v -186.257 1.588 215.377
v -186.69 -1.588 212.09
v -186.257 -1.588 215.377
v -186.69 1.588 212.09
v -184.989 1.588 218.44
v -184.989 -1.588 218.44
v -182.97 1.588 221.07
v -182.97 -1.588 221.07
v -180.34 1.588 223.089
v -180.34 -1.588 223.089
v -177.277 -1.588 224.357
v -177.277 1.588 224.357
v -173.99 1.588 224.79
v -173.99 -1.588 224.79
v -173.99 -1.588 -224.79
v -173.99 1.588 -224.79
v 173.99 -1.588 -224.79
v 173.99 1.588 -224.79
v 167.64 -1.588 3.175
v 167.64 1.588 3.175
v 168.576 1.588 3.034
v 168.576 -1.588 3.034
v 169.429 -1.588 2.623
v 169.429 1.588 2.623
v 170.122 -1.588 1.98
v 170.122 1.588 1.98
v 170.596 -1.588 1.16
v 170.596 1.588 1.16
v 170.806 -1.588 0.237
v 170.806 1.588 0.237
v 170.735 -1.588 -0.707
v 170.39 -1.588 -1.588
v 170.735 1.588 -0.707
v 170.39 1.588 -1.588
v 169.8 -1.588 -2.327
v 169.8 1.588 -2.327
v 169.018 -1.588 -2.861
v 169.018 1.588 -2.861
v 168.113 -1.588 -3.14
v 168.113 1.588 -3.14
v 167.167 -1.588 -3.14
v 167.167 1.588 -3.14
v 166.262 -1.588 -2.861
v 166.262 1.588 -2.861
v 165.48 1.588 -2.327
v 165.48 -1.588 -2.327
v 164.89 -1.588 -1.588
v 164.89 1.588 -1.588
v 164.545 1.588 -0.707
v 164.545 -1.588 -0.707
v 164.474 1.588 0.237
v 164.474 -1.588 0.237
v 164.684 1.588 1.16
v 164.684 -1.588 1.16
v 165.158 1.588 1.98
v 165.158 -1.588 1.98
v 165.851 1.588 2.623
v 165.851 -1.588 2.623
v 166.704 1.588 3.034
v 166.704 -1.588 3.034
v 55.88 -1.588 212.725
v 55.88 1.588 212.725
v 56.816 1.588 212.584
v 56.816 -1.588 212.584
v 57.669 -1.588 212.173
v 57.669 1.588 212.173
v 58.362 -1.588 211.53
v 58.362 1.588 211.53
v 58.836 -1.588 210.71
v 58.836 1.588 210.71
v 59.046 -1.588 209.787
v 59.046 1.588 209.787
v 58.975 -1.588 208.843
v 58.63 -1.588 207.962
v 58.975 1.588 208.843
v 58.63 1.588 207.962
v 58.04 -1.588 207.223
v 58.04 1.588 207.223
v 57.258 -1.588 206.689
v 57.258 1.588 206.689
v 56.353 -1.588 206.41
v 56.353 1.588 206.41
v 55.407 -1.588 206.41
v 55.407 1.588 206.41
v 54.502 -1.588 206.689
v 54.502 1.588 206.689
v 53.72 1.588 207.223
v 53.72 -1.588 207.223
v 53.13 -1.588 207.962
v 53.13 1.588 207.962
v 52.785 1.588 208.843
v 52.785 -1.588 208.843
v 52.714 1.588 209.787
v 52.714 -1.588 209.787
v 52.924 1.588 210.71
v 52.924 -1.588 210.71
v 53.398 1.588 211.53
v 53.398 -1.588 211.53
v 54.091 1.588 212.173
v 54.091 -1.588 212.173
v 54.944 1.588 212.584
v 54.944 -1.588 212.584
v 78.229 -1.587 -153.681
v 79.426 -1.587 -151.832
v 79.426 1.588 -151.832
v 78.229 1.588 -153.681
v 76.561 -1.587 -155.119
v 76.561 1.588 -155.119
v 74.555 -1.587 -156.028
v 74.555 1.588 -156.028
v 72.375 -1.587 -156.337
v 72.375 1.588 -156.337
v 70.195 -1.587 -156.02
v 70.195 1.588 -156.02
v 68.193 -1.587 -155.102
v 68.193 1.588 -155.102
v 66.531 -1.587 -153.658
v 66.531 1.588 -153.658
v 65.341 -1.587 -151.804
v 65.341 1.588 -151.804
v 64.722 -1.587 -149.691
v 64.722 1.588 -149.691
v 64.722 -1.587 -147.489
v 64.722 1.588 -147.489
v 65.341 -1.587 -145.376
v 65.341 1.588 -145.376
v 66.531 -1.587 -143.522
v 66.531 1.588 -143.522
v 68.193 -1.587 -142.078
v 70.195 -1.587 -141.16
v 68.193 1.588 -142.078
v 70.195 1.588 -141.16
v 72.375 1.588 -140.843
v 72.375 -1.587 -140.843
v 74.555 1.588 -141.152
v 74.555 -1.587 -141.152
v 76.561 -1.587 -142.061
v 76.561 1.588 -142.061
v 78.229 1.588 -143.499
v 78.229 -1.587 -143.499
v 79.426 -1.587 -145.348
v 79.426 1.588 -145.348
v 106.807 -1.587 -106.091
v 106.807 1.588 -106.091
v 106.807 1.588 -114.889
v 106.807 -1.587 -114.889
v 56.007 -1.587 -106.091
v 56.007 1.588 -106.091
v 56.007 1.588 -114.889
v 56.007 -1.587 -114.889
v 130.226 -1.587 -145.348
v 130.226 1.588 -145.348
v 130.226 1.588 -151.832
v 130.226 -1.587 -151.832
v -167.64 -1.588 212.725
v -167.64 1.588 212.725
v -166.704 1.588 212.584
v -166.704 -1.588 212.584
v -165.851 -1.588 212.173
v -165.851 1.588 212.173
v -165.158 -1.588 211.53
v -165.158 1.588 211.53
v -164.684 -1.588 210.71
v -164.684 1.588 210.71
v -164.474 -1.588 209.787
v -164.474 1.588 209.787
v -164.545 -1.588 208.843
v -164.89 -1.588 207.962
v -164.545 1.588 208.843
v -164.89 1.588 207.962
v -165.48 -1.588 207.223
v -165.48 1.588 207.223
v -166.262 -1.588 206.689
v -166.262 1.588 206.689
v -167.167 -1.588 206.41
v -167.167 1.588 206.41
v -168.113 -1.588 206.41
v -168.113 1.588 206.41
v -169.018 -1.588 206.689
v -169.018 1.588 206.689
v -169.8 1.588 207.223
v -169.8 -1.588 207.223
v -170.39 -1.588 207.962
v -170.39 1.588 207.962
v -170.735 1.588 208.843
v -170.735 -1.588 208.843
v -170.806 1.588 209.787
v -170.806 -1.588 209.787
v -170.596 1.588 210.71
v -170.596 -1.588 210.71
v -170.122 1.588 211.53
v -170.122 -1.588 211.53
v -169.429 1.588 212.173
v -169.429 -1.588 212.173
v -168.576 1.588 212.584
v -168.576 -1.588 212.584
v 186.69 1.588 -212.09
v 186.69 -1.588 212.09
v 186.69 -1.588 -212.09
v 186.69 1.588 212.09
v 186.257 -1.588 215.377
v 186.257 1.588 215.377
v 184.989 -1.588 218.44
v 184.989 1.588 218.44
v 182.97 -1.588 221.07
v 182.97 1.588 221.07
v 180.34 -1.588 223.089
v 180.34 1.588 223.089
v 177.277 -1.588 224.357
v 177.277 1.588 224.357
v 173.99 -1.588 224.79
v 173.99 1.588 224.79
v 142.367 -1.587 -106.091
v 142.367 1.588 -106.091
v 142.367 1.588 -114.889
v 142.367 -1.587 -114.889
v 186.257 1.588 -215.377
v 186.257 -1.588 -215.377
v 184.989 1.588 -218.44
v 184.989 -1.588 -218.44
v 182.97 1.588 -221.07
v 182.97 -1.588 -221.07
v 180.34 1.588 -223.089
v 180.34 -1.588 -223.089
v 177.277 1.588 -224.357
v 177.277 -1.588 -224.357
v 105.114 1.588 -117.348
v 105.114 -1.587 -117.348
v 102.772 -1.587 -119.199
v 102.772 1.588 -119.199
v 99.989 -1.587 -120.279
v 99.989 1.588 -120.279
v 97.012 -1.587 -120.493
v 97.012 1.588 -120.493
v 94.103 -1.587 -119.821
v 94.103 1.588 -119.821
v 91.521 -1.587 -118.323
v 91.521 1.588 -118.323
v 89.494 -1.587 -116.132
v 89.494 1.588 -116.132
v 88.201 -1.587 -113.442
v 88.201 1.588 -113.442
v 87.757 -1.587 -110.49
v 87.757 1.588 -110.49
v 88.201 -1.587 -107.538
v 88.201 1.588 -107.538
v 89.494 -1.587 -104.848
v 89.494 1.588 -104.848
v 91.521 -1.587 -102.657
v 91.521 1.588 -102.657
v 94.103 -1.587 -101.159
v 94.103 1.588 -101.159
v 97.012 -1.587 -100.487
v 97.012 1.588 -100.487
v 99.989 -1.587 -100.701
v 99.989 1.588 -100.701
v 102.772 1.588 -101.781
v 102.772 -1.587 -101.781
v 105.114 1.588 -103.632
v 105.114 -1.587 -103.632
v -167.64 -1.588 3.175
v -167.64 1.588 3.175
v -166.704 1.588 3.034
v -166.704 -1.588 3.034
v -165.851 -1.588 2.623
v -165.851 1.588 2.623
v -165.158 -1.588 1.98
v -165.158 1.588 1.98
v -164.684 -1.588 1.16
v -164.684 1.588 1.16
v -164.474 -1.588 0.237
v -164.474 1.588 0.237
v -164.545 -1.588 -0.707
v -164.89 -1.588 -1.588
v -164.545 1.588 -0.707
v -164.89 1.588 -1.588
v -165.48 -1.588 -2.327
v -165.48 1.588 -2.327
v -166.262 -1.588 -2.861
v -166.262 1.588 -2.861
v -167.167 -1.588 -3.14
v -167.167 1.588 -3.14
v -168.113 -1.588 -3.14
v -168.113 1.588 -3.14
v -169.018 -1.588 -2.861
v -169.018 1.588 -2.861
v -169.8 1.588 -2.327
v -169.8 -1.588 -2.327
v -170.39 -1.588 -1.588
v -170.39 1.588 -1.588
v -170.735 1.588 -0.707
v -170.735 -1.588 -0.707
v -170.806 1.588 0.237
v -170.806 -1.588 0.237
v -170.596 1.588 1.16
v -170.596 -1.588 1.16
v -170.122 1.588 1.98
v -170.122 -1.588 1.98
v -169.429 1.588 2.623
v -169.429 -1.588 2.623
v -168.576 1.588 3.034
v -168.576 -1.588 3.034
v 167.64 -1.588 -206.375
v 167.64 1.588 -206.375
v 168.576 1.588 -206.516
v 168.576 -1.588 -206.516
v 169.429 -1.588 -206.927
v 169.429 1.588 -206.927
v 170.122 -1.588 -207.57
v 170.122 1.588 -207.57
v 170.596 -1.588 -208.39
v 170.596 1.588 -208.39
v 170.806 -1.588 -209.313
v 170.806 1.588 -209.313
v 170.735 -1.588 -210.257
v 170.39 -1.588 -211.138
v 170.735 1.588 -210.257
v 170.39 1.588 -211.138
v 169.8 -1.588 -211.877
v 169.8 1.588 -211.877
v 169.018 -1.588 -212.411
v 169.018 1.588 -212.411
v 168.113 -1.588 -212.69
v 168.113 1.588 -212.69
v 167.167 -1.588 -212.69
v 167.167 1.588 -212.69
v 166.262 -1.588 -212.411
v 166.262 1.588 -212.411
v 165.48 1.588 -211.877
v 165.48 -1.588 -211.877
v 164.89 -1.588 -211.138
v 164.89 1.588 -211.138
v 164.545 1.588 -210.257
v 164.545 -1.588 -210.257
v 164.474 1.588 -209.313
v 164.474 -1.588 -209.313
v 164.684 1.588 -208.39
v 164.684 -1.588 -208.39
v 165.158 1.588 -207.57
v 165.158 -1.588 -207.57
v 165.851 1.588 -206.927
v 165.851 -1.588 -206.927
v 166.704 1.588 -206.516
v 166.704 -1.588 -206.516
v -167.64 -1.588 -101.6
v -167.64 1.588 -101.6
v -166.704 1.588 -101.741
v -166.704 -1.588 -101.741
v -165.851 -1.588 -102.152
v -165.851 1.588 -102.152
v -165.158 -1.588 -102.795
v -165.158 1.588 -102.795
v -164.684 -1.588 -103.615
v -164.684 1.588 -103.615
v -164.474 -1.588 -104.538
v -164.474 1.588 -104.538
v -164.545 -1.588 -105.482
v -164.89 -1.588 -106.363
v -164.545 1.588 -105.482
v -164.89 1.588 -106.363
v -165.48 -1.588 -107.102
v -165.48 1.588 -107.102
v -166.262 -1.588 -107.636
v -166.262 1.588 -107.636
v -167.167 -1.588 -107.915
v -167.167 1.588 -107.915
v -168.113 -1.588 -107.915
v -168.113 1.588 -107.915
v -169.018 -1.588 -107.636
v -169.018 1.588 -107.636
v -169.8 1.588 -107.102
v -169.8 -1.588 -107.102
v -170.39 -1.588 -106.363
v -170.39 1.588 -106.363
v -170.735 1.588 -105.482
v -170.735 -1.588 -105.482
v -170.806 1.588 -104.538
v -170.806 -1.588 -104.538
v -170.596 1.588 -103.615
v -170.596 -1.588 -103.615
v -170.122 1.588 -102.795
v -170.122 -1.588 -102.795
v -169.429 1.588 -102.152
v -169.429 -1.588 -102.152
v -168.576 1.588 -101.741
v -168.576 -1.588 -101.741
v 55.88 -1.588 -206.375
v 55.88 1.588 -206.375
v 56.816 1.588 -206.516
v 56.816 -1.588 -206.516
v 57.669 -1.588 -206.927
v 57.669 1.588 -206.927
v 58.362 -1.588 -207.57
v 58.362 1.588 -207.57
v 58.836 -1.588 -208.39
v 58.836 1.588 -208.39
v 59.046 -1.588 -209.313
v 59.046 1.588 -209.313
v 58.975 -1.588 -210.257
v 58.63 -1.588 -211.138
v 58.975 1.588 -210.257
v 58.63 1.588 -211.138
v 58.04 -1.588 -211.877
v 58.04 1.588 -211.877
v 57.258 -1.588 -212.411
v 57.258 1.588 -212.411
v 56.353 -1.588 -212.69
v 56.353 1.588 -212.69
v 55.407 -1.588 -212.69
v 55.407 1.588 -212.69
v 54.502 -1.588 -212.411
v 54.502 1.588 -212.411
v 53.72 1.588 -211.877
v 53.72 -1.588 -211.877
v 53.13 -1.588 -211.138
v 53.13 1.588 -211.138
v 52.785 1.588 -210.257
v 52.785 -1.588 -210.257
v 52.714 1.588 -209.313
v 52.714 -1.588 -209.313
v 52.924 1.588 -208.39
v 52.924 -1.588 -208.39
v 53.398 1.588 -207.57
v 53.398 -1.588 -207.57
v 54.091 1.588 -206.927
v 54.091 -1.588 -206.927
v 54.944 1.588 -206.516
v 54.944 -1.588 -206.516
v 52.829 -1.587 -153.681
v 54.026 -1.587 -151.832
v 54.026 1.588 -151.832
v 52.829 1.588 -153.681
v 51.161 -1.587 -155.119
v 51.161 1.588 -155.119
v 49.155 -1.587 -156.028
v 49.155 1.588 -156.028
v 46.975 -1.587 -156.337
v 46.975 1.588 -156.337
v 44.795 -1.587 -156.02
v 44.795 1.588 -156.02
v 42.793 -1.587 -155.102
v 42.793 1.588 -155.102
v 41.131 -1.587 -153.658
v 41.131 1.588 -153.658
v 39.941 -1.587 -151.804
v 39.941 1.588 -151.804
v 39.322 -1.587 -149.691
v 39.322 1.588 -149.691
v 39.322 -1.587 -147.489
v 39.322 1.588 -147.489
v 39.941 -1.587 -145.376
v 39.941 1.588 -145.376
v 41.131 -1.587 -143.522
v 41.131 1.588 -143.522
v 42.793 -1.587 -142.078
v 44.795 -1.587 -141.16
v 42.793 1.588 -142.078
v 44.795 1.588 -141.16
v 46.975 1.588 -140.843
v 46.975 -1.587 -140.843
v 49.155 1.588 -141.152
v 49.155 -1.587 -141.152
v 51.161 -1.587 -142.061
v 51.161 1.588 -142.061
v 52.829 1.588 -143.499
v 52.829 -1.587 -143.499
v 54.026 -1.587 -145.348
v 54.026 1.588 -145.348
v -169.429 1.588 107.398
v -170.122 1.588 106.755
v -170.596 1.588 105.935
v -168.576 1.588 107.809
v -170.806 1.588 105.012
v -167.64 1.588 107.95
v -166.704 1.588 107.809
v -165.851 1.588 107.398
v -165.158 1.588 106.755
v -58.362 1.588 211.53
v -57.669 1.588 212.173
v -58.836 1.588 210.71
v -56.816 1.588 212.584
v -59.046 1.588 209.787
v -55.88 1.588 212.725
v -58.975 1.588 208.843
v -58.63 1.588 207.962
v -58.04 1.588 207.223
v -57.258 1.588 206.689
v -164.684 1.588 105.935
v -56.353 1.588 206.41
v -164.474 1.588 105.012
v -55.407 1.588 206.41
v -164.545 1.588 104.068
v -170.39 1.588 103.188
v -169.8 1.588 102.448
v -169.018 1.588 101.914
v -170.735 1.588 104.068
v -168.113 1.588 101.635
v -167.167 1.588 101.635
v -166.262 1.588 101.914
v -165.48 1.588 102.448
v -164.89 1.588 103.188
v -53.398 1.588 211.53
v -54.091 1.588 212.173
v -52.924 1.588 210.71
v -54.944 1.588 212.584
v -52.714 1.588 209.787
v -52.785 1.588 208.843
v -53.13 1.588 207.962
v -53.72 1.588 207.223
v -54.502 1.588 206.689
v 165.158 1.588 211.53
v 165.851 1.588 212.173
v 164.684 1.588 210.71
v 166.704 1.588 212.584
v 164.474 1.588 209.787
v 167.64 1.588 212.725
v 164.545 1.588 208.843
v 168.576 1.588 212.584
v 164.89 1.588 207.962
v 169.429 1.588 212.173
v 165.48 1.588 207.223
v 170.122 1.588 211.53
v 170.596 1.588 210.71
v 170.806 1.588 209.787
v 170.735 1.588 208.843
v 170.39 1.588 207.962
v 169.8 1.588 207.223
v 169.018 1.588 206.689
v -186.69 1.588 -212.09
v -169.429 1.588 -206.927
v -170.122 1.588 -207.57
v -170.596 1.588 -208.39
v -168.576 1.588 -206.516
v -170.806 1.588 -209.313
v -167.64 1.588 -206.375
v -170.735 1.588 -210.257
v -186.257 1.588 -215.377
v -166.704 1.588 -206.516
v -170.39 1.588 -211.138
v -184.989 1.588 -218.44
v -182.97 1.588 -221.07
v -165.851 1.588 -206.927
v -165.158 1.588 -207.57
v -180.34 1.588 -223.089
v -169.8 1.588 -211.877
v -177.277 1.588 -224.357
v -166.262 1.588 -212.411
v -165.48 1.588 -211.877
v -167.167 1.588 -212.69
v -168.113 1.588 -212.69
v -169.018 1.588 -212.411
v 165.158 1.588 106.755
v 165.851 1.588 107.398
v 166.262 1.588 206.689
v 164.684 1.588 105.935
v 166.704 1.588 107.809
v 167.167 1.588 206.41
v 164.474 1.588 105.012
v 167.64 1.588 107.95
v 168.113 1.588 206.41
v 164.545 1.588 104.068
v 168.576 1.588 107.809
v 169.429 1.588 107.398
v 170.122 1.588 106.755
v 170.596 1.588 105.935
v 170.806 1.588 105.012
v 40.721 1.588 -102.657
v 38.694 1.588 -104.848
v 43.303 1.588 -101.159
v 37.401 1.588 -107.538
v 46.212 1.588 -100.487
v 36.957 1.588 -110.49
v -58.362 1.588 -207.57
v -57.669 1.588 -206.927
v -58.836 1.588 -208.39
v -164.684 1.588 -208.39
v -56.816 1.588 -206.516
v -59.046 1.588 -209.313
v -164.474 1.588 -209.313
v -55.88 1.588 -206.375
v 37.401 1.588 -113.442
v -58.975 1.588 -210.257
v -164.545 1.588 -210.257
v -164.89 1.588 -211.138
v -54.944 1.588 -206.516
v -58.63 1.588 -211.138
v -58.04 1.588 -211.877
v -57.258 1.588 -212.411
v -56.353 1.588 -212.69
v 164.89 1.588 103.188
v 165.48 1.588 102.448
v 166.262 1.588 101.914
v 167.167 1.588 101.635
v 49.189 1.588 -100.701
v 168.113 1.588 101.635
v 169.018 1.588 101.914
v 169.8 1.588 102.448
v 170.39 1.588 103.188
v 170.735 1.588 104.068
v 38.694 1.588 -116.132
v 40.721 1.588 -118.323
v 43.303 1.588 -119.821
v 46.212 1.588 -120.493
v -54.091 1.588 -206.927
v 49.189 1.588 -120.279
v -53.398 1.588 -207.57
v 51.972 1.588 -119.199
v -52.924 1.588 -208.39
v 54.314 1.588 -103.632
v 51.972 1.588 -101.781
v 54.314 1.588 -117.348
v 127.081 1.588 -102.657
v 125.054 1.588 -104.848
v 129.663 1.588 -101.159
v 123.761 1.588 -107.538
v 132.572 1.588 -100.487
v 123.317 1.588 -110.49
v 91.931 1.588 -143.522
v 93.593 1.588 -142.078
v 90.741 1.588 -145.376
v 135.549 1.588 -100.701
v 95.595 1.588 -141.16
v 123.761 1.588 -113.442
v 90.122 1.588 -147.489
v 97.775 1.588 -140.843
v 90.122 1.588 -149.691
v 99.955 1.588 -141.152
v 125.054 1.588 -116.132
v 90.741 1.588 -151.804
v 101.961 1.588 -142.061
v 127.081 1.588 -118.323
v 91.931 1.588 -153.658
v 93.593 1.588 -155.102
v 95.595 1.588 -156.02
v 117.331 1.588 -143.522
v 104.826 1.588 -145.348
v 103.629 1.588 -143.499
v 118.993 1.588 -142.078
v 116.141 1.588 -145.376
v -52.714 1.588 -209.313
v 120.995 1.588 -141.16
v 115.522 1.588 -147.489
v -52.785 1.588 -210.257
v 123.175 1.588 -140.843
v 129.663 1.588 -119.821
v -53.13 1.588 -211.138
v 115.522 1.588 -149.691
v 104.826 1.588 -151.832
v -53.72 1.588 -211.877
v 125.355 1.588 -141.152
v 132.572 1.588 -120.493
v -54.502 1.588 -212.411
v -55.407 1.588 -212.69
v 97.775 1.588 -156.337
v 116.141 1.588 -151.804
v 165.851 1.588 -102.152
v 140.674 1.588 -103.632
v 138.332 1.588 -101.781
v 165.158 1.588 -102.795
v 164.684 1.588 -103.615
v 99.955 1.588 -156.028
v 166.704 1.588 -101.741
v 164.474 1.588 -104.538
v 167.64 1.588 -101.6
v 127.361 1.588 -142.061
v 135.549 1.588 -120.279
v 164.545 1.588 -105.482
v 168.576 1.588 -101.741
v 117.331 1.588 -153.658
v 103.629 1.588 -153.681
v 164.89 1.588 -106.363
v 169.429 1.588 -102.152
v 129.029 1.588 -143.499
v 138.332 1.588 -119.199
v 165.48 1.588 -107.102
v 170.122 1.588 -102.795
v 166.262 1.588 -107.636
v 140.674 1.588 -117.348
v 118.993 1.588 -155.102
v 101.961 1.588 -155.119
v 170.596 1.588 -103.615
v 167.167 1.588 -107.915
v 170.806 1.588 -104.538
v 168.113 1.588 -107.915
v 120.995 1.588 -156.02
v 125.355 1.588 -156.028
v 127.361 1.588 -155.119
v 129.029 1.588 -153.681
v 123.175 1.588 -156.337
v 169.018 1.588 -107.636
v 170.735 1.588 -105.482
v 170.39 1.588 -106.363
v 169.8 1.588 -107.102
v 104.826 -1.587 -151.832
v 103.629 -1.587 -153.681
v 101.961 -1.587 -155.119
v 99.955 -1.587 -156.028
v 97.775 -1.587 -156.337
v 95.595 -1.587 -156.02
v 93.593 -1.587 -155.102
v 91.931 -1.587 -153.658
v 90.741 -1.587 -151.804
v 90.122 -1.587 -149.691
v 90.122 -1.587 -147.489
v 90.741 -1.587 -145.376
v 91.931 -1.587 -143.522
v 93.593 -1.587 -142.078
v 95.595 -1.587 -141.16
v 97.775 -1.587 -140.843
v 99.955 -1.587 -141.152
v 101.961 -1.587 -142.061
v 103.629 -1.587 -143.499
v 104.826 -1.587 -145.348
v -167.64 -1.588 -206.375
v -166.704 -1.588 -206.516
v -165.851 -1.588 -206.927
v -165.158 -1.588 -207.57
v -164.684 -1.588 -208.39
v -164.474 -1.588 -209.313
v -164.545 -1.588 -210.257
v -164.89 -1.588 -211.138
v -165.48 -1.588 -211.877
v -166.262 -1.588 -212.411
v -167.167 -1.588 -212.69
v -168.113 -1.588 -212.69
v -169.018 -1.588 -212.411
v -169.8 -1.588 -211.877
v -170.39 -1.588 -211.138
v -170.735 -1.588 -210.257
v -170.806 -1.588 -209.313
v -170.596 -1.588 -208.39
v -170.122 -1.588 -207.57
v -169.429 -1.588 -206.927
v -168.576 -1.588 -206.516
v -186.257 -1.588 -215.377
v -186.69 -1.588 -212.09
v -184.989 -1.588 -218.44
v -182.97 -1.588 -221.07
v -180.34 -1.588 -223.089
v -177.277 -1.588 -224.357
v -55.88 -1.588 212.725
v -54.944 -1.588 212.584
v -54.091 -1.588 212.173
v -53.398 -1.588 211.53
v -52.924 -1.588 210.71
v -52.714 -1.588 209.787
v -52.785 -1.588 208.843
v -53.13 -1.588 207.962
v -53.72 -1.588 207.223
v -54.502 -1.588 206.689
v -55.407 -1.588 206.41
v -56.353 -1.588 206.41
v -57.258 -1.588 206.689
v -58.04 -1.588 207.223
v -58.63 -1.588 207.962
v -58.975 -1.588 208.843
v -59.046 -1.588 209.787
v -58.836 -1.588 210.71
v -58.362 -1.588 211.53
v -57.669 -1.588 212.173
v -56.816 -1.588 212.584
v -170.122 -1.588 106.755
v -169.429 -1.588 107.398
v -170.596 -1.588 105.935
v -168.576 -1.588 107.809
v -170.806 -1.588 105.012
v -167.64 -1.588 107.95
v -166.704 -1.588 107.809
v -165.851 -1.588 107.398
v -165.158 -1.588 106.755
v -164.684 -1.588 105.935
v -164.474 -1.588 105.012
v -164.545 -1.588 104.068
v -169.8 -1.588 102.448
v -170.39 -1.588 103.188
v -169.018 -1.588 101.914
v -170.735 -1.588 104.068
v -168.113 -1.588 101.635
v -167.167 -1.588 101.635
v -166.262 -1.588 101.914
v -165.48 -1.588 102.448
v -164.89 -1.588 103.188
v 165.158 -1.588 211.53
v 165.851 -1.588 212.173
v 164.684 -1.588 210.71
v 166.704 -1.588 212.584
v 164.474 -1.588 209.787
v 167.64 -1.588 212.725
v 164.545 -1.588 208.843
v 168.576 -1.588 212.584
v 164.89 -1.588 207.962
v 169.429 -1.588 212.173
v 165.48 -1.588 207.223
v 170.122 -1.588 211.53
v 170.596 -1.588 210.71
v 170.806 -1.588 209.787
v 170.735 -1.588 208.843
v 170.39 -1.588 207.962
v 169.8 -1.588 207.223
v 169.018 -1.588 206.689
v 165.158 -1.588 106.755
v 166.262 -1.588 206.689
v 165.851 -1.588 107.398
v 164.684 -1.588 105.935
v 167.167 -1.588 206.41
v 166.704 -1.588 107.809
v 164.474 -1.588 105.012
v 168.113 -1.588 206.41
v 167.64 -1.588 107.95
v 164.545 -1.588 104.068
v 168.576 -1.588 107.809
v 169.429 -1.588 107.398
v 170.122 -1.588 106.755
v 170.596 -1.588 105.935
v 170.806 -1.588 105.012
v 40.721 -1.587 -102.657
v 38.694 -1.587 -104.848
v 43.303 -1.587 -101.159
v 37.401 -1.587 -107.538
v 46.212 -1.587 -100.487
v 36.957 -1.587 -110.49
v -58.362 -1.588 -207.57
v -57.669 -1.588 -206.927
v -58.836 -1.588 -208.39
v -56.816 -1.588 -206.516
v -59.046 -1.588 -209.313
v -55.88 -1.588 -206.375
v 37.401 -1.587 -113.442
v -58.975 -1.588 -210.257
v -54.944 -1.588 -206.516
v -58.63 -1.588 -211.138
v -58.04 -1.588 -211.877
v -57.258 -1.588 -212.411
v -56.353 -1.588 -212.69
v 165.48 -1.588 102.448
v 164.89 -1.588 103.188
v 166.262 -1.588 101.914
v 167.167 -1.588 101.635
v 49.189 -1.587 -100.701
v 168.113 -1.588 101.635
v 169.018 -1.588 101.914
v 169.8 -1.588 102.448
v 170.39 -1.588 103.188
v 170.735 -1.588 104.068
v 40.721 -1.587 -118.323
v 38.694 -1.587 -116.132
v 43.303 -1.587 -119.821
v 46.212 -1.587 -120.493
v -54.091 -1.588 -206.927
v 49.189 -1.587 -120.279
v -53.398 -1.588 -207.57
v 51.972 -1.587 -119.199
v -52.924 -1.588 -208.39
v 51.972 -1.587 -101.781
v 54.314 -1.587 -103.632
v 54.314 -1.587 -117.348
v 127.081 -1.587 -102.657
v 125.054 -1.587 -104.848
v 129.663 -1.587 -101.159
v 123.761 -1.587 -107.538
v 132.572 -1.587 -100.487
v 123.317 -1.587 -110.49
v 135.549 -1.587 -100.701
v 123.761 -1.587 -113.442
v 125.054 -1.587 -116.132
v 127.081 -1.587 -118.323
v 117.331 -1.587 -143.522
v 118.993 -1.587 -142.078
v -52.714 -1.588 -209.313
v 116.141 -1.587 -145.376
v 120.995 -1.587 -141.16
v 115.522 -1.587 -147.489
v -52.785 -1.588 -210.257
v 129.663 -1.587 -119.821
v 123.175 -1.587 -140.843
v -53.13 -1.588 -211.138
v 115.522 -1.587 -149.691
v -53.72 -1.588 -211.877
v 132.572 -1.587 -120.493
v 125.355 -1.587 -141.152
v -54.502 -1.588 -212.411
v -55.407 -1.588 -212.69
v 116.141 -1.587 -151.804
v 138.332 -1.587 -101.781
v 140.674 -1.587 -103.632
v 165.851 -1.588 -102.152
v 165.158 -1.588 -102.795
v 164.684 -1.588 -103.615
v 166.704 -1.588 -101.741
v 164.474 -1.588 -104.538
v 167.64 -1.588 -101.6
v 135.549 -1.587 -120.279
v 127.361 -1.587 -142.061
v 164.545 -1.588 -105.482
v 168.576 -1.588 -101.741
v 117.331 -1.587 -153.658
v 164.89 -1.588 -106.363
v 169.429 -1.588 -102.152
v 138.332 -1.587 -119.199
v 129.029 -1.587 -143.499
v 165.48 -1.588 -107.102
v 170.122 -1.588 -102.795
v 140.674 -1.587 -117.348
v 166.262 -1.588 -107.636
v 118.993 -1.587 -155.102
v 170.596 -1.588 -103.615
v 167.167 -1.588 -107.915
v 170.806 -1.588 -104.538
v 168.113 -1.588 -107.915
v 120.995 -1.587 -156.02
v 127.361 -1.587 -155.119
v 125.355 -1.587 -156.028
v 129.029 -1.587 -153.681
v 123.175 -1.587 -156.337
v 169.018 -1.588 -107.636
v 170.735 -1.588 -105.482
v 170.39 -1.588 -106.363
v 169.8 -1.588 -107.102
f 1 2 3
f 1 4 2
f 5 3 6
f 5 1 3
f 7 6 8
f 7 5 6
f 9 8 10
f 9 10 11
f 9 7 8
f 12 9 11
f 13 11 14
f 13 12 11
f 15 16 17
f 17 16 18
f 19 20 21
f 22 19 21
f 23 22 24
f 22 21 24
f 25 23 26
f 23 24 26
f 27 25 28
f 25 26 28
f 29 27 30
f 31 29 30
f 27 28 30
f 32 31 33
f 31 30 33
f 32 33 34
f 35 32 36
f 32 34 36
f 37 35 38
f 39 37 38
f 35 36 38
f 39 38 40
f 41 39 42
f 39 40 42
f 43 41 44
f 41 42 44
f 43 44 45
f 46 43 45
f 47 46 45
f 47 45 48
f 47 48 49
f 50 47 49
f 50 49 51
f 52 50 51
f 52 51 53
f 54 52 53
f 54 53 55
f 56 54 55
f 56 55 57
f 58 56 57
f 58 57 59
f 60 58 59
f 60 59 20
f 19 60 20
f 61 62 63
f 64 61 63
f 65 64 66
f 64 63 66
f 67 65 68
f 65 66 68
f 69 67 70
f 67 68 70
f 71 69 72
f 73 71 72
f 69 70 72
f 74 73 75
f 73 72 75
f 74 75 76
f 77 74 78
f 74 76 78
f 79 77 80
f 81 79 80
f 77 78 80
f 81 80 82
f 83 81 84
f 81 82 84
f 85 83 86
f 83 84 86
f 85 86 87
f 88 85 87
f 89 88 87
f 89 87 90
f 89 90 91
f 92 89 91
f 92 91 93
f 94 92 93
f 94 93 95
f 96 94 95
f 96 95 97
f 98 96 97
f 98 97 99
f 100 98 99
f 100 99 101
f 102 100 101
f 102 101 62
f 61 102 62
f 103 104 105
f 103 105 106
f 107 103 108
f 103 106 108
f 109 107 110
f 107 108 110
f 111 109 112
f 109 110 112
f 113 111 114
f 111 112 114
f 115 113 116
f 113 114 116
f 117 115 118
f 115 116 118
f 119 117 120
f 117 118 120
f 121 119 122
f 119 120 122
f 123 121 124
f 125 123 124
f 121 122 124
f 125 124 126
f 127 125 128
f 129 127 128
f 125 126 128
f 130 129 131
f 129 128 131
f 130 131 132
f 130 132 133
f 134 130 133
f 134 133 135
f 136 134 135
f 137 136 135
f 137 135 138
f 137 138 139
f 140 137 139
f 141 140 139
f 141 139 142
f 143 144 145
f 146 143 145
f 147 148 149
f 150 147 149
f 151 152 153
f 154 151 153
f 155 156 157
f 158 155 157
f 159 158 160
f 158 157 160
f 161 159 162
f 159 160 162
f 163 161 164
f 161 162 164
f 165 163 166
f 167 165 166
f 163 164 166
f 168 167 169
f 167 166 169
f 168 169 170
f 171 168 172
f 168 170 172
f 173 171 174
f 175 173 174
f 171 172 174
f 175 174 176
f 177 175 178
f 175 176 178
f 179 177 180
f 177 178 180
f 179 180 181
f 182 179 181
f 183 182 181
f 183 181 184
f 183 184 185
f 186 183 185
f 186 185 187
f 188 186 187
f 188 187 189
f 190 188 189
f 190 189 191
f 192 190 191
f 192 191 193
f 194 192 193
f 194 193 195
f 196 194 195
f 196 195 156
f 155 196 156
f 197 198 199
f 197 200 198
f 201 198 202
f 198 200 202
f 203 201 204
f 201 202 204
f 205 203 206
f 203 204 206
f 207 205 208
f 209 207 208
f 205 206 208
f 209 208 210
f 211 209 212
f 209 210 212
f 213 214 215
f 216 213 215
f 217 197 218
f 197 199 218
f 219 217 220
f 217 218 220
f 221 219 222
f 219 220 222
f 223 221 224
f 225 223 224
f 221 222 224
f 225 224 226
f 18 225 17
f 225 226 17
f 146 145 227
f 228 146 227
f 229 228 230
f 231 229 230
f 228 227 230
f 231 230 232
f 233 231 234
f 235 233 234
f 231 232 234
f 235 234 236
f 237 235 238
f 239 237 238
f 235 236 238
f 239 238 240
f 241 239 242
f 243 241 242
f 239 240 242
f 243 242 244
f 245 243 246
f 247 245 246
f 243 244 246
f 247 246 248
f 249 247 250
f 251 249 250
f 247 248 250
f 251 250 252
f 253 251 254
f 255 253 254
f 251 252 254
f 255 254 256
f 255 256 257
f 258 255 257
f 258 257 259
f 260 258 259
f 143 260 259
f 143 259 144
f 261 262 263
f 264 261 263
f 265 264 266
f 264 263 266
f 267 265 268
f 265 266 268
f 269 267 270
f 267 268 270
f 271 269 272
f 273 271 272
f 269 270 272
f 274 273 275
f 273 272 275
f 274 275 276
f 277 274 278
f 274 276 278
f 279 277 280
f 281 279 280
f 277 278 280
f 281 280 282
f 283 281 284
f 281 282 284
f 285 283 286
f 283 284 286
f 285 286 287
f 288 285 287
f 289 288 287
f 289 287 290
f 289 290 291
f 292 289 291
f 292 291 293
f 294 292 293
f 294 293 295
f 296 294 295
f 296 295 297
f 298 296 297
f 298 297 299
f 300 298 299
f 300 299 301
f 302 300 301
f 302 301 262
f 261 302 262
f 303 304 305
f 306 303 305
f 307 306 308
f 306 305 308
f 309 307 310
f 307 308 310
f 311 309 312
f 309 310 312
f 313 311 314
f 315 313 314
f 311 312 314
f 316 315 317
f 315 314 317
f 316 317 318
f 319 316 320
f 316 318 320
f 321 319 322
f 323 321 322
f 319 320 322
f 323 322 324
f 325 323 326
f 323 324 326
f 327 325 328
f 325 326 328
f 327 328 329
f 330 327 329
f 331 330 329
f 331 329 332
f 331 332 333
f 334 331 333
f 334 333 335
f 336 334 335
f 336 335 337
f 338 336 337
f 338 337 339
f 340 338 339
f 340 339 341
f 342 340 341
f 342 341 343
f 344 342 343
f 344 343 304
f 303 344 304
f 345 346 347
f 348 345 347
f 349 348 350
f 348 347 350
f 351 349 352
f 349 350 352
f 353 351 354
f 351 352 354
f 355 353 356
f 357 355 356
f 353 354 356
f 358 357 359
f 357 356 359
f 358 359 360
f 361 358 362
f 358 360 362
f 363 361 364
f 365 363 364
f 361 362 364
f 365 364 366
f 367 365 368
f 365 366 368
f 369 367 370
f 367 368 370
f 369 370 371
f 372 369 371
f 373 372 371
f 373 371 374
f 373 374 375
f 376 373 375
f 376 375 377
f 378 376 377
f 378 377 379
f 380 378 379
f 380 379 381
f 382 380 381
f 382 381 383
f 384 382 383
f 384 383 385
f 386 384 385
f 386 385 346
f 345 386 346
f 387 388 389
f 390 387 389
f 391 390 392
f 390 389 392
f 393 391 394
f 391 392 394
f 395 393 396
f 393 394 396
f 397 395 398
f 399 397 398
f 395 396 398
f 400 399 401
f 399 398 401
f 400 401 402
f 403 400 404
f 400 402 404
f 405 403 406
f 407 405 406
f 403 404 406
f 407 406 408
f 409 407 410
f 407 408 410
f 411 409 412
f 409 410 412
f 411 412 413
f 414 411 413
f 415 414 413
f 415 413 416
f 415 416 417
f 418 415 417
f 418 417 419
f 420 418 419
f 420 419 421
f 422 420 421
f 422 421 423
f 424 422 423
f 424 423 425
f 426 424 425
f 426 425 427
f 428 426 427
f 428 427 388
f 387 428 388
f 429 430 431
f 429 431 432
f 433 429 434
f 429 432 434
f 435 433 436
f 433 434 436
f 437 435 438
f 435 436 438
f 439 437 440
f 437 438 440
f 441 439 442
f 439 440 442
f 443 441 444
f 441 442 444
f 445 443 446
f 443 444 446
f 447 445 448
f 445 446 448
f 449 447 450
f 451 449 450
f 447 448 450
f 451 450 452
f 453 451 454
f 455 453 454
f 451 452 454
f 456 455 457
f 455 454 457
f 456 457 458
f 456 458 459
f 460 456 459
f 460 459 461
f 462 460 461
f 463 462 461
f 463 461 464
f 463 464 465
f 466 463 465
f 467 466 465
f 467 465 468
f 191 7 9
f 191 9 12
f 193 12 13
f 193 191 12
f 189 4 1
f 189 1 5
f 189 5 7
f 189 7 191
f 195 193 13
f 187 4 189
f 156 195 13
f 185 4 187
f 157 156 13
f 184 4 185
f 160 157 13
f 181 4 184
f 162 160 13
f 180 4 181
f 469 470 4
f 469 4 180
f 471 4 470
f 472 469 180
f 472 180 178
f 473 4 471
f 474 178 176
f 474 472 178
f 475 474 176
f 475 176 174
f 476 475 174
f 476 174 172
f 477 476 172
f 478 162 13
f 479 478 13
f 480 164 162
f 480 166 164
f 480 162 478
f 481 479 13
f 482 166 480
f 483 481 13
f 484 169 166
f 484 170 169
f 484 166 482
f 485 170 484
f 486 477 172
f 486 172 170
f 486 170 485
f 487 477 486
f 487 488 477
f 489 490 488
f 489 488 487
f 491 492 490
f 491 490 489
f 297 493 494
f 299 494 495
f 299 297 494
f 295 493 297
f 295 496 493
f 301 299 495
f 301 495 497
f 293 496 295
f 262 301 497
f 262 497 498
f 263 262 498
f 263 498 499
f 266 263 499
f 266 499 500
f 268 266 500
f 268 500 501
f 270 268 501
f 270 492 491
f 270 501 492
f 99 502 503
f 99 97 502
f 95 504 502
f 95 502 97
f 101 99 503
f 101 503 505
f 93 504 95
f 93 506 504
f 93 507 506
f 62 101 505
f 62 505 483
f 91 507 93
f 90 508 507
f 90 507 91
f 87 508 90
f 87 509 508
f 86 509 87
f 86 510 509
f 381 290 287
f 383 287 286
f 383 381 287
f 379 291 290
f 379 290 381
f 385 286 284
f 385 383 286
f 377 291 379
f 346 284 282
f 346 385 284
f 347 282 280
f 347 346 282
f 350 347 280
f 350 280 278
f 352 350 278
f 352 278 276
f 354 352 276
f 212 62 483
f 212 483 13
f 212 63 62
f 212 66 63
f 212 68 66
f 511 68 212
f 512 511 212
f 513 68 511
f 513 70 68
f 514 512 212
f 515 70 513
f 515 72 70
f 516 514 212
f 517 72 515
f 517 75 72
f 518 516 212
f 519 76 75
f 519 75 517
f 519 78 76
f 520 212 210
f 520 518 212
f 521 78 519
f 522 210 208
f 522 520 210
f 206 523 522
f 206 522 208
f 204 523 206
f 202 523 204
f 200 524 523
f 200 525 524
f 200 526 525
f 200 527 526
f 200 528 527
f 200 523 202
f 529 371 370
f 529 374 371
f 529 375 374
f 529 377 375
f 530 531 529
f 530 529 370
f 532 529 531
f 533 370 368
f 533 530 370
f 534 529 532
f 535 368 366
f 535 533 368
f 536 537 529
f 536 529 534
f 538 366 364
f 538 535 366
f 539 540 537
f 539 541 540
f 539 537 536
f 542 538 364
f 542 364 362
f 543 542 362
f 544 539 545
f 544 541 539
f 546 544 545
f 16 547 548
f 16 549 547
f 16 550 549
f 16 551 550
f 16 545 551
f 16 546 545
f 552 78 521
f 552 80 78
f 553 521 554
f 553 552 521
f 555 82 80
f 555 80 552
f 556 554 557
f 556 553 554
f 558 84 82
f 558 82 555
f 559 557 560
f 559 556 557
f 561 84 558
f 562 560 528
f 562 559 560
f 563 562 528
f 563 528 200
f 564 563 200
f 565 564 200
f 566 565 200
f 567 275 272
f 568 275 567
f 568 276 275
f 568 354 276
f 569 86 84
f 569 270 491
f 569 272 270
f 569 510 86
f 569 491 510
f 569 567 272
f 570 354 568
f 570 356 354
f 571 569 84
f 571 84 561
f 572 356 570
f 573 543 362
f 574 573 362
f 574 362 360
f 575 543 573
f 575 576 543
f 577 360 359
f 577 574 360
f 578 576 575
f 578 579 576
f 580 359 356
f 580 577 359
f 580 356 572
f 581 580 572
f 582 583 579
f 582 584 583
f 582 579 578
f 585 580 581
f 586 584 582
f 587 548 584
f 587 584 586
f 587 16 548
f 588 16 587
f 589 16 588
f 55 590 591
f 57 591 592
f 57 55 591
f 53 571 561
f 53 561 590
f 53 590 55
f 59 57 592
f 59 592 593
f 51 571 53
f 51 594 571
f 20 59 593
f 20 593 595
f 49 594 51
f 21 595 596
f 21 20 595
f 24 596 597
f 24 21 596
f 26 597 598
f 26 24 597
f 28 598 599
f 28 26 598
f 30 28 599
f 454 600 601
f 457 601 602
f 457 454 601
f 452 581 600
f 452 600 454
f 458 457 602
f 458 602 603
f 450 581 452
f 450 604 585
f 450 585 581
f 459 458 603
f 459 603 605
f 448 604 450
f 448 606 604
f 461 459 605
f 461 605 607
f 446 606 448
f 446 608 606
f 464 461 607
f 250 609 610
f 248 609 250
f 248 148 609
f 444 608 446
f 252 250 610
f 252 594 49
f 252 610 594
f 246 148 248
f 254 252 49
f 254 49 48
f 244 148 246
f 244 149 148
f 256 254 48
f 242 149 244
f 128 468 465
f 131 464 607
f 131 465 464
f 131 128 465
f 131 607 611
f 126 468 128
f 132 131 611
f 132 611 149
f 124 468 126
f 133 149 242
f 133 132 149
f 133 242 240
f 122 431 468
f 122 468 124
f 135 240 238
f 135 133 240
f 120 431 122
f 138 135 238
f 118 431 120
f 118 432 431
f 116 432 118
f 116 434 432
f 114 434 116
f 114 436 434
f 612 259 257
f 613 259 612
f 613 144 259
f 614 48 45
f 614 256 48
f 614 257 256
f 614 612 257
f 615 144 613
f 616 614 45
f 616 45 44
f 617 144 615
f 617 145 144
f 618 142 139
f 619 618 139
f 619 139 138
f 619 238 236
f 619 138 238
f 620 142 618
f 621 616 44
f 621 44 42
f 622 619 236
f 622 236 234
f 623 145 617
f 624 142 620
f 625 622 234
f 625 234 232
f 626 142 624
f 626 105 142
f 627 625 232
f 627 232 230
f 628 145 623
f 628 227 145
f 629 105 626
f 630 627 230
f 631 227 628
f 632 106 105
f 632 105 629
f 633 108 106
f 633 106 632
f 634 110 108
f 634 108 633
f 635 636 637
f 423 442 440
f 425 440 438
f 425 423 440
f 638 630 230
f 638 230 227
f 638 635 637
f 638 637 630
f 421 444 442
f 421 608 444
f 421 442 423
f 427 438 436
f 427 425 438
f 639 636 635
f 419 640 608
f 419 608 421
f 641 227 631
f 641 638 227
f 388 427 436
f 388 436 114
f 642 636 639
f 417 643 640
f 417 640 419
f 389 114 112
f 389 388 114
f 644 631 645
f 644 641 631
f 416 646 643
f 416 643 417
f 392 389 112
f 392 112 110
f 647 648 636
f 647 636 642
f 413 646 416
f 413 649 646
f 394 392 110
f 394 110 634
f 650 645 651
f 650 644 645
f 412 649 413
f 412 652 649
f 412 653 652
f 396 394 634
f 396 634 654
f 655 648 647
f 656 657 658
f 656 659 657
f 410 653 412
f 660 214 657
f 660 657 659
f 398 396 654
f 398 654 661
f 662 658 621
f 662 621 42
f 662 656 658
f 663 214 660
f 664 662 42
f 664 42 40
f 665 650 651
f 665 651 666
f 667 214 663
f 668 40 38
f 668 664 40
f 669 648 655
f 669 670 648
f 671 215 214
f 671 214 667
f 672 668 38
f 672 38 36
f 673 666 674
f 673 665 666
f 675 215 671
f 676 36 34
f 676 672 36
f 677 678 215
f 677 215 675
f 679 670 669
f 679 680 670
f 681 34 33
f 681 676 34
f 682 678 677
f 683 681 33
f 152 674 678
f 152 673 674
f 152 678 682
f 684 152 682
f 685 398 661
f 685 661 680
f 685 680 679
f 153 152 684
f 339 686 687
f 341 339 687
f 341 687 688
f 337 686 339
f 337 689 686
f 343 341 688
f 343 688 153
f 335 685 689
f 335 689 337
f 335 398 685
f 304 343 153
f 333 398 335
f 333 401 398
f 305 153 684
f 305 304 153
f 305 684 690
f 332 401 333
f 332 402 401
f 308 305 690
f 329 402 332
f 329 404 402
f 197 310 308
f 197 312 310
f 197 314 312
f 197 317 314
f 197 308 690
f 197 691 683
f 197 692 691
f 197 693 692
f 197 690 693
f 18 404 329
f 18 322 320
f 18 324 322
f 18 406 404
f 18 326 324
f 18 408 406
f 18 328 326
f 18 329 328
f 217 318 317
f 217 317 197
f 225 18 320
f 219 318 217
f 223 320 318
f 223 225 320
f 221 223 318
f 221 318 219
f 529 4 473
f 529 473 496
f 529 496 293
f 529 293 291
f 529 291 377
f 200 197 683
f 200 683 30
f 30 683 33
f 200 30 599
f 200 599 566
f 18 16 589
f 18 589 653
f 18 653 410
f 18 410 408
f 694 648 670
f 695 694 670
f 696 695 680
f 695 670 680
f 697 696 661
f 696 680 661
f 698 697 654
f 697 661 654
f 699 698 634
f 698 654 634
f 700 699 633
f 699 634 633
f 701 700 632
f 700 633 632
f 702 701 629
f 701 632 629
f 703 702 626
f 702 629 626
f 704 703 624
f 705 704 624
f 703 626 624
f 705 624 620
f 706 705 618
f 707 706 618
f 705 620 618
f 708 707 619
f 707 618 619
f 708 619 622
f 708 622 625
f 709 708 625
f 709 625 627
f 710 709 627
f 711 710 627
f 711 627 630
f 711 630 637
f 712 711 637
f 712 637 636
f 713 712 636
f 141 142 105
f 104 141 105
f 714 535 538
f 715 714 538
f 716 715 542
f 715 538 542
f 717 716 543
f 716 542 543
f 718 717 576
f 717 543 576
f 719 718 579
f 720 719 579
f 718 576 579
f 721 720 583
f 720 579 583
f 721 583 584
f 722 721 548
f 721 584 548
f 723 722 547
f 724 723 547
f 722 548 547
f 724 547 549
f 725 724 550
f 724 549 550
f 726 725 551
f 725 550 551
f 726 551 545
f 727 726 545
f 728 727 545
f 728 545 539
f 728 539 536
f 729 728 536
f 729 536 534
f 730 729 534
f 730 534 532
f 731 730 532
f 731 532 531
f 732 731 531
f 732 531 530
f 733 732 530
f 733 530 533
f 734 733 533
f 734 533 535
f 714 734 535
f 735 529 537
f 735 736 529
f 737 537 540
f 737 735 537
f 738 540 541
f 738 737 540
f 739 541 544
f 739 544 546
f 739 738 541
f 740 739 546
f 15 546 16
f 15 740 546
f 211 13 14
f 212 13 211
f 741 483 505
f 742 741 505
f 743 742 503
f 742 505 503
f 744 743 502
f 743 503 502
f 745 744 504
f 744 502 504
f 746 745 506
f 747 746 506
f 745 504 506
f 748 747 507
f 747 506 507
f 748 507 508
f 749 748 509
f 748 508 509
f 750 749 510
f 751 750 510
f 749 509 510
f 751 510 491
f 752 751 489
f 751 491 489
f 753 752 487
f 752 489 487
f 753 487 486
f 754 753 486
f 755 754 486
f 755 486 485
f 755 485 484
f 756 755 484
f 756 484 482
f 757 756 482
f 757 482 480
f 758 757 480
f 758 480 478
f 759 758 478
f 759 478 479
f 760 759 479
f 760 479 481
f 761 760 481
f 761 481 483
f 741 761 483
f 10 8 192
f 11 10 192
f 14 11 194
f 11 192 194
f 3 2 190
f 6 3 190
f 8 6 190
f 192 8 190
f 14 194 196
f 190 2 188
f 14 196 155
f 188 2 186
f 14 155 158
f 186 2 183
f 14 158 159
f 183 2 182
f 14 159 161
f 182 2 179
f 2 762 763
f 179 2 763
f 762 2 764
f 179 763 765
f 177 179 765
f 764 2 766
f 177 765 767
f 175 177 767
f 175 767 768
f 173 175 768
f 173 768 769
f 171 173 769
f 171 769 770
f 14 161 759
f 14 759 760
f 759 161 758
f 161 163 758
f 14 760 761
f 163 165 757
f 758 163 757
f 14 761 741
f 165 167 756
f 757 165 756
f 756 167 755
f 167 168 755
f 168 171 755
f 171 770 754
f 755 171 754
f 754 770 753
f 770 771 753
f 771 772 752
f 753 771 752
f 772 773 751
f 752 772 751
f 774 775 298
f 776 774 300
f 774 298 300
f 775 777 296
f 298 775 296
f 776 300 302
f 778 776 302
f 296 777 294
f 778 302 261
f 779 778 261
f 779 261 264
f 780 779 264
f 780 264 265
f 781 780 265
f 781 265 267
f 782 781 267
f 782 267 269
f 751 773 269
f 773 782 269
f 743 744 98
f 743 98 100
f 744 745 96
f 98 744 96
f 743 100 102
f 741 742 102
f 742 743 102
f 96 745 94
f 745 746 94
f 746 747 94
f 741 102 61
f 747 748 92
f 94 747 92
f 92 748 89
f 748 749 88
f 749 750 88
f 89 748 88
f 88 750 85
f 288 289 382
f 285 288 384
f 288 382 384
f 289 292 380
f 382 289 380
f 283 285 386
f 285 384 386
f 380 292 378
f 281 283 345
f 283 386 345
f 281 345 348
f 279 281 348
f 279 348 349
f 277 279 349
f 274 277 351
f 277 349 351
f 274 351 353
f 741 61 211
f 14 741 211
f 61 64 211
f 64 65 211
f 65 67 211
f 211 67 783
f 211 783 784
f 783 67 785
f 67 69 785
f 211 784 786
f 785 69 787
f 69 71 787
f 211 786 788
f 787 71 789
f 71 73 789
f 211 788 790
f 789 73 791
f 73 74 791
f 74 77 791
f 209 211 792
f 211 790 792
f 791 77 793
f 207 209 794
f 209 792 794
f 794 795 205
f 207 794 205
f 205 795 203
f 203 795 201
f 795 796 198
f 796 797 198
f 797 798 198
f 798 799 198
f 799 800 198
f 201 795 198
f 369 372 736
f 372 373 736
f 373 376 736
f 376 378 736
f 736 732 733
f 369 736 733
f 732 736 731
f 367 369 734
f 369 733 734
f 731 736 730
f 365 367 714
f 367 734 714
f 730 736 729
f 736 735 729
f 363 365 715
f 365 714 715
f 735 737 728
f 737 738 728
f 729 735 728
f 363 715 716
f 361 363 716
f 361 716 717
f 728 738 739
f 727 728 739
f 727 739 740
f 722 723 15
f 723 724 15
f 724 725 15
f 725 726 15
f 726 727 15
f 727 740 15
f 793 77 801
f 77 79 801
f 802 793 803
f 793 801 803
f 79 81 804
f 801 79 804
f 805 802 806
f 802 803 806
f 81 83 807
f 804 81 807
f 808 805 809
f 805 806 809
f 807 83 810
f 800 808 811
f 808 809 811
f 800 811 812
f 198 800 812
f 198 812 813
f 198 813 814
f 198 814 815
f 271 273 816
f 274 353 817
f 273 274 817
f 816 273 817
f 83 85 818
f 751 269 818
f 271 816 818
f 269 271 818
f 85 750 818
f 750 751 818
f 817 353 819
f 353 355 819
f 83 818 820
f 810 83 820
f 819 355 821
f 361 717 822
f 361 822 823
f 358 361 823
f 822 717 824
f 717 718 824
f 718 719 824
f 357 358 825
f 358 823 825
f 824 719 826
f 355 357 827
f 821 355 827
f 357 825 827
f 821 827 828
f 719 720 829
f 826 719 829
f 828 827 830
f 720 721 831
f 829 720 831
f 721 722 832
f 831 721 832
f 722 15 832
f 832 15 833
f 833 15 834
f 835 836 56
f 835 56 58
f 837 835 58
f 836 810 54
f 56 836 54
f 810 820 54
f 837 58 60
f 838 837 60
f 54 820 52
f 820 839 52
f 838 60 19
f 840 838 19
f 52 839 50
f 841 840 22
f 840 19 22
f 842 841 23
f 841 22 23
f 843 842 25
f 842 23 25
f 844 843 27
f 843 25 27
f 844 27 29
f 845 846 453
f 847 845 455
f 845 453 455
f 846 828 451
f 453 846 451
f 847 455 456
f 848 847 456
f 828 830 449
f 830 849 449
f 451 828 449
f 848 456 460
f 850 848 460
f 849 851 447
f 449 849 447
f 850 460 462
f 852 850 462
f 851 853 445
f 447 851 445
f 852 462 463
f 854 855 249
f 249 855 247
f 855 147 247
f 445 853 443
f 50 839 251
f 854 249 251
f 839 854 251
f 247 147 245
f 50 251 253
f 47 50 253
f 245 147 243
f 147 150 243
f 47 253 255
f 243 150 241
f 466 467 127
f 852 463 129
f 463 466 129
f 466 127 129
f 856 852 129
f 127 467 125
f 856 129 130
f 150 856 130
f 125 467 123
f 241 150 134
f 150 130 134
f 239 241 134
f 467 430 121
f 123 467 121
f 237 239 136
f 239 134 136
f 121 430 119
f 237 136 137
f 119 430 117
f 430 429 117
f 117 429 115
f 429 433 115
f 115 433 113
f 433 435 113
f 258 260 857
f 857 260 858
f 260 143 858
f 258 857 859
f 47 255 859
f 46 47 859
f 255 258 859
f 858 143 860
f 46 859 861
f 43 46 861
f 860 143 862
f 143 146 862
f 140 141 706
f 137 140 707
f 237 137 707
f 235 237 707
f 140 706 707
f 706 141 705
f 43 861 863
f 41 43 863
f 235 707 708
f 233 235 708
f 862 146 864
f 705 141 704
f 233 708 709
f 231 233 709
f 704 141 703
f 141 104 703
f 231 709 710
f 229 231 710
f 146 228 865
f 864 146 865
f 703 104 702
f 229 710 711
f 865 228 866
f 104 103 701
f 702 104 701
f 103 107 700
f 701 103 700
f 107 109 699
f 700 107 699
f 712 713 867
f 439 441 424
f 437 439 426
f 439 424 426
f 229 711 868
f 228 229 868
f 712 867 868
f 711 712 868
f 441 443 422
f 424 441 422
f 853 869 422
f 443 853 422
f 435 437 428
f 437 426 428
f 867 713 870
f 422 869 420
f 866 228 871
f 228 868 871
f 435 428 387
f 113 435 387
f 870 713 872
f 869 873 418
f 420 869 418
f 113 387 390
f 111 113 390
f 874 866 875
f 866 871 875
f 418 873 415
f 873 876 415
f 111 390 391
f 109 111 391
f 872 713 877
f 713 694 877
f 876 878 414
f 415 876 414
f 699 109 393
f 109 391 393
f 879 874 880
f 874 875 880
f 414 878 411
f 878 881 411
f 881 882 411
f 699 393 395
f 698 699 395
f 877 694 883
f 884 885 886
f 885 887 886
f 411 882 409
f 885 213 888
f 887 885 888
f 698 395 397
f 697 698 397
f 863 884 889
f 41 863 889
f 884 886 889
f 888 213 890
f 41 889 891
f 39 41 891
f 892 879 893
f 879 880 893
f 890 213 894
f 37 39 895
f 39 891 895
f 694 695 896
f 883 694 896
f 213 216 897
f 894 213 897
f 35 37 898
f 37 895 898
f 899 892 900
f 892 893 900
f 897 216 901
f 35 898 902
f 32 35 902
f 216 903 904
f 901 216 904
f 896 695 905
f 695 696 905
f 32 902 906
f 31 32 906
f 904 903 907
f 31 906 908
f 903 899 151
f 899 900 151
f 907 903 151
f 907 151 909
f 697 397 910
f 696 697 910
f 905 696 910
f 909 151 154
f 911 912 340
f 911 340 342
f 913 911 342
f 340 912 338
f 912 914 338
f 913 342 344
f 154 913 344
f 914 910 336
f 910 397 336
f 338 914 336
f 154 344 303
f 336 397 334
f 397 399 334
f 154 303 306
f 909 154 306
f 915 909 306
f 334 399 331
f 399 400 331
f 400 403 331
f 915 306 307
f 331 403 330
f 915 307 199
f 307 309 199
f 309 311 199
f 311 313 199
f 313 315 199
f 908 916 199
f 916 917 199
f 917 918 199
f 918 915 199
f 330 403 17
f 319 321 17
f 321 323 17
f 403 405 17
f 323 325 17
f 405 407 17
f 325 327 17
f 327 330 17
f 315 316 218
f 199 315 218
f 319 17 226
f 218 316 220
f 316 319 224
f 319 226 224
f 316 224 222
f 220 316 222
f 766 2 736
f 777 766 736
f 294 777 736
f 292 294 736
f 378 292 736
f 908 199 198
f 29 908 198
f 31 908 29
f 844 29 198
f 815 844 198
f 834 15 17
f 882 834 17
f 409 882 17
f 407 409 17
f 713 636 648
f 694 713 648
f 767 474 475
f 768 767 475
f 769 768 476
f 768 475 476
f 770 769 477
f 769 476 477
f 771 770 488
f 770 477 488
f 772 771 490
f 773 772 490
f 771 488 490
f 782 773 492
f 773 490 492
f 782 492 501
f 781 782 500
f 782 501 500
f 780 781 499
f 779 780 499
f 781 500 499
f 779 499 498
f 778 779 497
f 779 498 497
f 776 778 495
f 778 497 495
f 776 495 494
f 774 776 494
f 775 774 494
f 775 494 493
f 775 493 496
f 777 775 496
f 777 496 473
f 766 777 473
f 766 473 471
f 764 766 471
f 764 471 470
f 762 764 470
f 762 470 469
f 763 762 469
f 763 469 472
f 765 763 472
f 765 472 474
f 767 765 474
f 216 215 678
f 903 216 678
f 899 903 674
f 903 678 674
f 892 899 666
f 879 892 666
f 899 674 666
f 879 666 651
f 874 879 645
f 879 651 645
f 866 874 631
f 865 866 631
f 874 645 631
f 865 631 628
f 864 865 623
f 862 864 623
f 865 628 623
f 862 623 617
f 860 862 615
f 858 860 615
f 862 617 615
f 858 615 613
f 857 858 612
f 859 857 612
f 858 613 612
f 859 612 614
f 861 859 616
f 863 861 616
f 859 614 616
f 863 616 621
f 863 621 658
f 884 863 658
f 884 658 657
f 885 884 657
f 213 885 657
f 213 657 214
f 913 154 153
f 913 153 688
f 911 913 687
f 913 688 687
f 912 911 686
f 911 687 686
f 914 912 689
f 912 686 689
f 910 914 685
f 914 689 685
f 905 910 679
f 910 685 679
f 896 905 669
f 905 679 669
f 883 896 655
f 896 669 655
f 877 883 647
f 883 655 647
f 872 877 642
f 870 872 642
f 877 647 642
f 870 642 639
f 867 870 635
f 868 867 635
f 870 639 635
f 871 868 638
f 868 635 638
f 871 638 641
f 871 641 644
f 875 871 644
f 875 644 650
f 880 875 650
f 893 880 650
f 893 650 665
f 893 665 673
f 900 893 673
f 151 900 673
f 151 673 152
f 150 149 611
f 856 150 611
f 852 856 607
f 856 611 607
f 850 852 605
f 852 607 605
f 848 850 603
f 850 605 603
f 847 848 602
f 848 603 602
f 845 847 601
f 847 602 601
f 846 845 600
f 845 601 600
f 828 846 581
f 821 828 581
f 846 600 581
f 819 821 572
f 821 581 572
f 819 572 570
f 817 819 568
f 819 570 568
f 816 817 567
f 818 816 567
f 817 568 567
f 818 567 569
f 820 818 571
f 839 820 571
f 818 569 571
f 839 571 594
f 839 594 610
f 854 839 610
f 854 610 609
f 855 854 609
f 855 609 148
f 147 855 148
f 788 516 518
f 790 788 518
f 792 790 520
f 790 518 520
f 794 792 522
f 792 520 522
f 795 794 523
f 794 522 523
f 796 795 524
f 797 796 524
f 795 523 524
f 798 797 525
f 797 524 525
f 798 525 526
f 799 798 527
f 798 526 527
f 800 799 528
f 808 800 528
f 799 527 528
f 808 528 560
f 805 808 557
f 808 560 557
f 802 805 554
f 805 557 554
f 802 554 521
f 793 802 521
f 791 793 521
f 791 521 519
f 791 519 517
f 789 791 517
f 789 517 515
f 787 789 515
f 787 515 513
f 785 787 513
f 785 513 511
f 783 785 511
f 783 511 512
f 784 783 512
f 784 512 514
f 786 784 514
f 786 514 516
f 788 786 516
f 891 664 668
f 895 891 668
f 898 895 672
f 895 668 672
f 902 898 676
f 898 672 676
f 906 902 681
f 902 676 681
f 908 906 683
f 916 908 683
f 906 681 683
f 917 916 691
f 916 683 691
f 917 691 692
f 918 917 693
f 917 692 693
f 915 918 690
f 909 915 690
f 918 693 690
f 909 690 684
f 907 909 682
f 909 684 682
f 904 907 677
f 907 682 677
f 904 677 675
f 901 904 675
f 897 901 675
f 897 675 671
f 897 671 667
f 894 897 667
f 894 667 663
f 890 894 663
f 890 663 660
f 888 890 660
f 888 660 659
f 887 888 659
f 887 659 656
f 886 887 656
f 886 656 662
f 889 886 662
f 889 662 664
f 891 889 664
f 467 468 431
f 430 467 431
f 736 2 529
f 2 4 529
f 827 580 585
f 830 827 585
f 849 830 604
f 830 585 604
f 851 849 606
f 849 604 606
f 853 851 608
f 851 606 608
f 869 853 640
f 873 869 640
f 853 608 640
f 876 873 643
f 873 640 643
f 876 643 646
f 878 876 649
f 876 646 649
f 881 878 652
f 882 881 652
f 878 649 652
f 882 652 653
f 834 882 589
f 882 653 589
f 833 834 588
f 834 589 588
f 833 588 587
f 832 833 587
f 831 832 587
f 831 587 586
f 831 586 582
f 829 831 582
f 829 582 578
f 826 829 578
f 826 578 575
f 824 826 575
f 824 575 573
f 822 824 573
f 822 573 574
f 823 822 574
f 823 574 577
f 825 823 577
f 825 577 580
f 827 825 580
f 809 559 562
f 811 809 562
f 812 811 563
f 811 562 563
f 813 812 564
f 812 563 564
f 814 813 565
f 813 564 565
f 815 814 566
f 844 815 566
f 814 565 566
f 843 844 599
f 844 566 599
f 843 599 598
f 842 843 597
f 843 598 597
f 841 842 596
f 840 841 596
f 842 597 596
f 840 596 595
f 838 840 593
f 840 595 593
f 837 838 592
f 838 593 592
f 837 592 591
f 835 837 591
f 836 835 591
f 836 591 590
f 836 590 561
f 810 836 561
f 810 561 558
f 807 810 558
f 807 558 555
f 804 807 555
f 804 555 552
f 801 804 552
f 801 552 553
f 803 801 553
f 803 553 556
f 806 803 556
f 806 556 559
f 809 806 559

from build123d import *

# Parameters (mm, degrees)
SKETCH1_W            = 373.38
SKETCH1_H            = 449.58
BOSS_EXTRUDE1_DEPTH  = 1.5875
FILLET1_R            = 12.7
SKETCH2_R            = 3.175
CUT_EXTRUDE1_DEPTH   = 293.222142941
LPATTERN1_COUNT      = 4
LPATTERN1_PITCH      = 111.76
LPATTERN1_COUNT_DIR2 = 5
LPATTERN1_PITCH_DIR2 = 104.775
CUT_EXTRUDE2_DEPTH   = 303.544238838


with BuildPart() as part:
    # Sketch1 → Boss-Extrude1 (new, symmetric)
    with BuildSketch(Plane(origin=(0, 0, 0), x_dir=(1, 0, 0), z_dir=(0, 1, 0))):
        Rectangle(SKETCH1_W, SKETCH1_H)
    extrude(amount=BOSS_EXTRUDE1_DEPTH, both=True)

    # Fillet1
    fillet1_edges = [part.edges().sort_by_distance(p)[0] for p in [
        (186.69, 0, 224.79),
        (-186.69, 0, 224.79),
        (-186.69, 0, -224.79),
        (186.69, 0, -224.79),
    ]]
    fillet(fillet1_edges, radius=FILLET1_R)

    # Sketch2 → Cut-Extrude1 (cut, through all)
    with BuildSketch(Plane(origin=(0, 1.5875, 0), x_dir=(1, 0, 0), z_dir=(0, 1, 0))):
        with Locations(Location((-167.64, 209.55, 0), (0, 0, 270))):
            Circle(SKETCH2_R)
    cut_extrude1 = extrude(amount=-CUT_EXTRUDE1_DEPTH, mode=Mode.SUBTRACT)

    # LPattern1: Cut-Extrude1 4 × 5, 6 skipped
    with Locations(*[(i * LPATTERN1_PITCH, 0, j * LPATTERN1_PITCH_DIR2) for i in range(LPATTERN1_COUNT) for j in range(LPATTERN1_COUNT_DIR2) if (i, j) not in ((0, 0), (1, 1), (1, 2), (1, 3), (2, 1), (2, 2), (2, 3))]):
        add(cut_extrude1, mode=Mode.SUBTRACT)

    # Sketch3 → Cut-Extrude2 (cut, through all)
    with BuildSketch(Plane(origin=(13.560082756, 17.4625, -1.196765785), x_dir=(1, 0, 0), z_dir=(0, 1, 0))):
        with BuildLine():
            ThreePointArc((128.806917244, 113.692643266), (109.756917244, 109.293234215), (128.806917244, 104.893825163))
            Line((128.806917244, 104.893825163), (128.806917244, 113.692643266))
        make_face()
        with BuildLine():
            ThreePointArc((116.665717244, 150.635691209), (101.882917244, 147.393234215), (116.665717244, 144.15077722))
            Line((116.665717244, 144.15077722), (116.665717244, 150.635691209))
        make_face()
        with BuildLine():
            ThreePointArc((91.265717244, 150.635691209), (76.482917244, 147.393234215), (91.265717244, 144.15077722))
            Line((91.265717244, 144.15077722), (91.265717244, 150.635691209))
        make_face()
        with BuildLine():
            ThreePointArc((93.246917244, 113.692643266), (74.196917244, 109.293234215), (93.246917244, 104.893825163))
            Line((93.246917244, 104.893825163), (93.246917244, 113.692643266))
        make_face()
        with BuildLine():
            ThreePointArc((65.865717244, 150.635691209), (51.082917244, 147.393234215), (65.865717244, 144.15077722))
            Line((65.865717244, 144.15077722), (65.865717244, 150.635691209))
        make_face()
        with BuildLine():
            ThreePointArc((40.465717244, 150.635691209), (25.682917244, 147.393234215), (40.465717244, 144.15077722))
            Line((40.465717244, 144.15077722), (40.465717244, 150.635691209))
        make_face()
        with BuildLine():
            ThreePointArc((42.446917244, 113.692643266), (23.396917244, 109.293234215), (42.446917244, 104.893825163))
            Line((42.446917244, 104.893825163), (42.446917244, 113.692643266))
        make_face()
    extrude(amount=-CUT_EXTRUDE2_DEPTH, mode=Mode.SUBTRACT)


solid = part.part
